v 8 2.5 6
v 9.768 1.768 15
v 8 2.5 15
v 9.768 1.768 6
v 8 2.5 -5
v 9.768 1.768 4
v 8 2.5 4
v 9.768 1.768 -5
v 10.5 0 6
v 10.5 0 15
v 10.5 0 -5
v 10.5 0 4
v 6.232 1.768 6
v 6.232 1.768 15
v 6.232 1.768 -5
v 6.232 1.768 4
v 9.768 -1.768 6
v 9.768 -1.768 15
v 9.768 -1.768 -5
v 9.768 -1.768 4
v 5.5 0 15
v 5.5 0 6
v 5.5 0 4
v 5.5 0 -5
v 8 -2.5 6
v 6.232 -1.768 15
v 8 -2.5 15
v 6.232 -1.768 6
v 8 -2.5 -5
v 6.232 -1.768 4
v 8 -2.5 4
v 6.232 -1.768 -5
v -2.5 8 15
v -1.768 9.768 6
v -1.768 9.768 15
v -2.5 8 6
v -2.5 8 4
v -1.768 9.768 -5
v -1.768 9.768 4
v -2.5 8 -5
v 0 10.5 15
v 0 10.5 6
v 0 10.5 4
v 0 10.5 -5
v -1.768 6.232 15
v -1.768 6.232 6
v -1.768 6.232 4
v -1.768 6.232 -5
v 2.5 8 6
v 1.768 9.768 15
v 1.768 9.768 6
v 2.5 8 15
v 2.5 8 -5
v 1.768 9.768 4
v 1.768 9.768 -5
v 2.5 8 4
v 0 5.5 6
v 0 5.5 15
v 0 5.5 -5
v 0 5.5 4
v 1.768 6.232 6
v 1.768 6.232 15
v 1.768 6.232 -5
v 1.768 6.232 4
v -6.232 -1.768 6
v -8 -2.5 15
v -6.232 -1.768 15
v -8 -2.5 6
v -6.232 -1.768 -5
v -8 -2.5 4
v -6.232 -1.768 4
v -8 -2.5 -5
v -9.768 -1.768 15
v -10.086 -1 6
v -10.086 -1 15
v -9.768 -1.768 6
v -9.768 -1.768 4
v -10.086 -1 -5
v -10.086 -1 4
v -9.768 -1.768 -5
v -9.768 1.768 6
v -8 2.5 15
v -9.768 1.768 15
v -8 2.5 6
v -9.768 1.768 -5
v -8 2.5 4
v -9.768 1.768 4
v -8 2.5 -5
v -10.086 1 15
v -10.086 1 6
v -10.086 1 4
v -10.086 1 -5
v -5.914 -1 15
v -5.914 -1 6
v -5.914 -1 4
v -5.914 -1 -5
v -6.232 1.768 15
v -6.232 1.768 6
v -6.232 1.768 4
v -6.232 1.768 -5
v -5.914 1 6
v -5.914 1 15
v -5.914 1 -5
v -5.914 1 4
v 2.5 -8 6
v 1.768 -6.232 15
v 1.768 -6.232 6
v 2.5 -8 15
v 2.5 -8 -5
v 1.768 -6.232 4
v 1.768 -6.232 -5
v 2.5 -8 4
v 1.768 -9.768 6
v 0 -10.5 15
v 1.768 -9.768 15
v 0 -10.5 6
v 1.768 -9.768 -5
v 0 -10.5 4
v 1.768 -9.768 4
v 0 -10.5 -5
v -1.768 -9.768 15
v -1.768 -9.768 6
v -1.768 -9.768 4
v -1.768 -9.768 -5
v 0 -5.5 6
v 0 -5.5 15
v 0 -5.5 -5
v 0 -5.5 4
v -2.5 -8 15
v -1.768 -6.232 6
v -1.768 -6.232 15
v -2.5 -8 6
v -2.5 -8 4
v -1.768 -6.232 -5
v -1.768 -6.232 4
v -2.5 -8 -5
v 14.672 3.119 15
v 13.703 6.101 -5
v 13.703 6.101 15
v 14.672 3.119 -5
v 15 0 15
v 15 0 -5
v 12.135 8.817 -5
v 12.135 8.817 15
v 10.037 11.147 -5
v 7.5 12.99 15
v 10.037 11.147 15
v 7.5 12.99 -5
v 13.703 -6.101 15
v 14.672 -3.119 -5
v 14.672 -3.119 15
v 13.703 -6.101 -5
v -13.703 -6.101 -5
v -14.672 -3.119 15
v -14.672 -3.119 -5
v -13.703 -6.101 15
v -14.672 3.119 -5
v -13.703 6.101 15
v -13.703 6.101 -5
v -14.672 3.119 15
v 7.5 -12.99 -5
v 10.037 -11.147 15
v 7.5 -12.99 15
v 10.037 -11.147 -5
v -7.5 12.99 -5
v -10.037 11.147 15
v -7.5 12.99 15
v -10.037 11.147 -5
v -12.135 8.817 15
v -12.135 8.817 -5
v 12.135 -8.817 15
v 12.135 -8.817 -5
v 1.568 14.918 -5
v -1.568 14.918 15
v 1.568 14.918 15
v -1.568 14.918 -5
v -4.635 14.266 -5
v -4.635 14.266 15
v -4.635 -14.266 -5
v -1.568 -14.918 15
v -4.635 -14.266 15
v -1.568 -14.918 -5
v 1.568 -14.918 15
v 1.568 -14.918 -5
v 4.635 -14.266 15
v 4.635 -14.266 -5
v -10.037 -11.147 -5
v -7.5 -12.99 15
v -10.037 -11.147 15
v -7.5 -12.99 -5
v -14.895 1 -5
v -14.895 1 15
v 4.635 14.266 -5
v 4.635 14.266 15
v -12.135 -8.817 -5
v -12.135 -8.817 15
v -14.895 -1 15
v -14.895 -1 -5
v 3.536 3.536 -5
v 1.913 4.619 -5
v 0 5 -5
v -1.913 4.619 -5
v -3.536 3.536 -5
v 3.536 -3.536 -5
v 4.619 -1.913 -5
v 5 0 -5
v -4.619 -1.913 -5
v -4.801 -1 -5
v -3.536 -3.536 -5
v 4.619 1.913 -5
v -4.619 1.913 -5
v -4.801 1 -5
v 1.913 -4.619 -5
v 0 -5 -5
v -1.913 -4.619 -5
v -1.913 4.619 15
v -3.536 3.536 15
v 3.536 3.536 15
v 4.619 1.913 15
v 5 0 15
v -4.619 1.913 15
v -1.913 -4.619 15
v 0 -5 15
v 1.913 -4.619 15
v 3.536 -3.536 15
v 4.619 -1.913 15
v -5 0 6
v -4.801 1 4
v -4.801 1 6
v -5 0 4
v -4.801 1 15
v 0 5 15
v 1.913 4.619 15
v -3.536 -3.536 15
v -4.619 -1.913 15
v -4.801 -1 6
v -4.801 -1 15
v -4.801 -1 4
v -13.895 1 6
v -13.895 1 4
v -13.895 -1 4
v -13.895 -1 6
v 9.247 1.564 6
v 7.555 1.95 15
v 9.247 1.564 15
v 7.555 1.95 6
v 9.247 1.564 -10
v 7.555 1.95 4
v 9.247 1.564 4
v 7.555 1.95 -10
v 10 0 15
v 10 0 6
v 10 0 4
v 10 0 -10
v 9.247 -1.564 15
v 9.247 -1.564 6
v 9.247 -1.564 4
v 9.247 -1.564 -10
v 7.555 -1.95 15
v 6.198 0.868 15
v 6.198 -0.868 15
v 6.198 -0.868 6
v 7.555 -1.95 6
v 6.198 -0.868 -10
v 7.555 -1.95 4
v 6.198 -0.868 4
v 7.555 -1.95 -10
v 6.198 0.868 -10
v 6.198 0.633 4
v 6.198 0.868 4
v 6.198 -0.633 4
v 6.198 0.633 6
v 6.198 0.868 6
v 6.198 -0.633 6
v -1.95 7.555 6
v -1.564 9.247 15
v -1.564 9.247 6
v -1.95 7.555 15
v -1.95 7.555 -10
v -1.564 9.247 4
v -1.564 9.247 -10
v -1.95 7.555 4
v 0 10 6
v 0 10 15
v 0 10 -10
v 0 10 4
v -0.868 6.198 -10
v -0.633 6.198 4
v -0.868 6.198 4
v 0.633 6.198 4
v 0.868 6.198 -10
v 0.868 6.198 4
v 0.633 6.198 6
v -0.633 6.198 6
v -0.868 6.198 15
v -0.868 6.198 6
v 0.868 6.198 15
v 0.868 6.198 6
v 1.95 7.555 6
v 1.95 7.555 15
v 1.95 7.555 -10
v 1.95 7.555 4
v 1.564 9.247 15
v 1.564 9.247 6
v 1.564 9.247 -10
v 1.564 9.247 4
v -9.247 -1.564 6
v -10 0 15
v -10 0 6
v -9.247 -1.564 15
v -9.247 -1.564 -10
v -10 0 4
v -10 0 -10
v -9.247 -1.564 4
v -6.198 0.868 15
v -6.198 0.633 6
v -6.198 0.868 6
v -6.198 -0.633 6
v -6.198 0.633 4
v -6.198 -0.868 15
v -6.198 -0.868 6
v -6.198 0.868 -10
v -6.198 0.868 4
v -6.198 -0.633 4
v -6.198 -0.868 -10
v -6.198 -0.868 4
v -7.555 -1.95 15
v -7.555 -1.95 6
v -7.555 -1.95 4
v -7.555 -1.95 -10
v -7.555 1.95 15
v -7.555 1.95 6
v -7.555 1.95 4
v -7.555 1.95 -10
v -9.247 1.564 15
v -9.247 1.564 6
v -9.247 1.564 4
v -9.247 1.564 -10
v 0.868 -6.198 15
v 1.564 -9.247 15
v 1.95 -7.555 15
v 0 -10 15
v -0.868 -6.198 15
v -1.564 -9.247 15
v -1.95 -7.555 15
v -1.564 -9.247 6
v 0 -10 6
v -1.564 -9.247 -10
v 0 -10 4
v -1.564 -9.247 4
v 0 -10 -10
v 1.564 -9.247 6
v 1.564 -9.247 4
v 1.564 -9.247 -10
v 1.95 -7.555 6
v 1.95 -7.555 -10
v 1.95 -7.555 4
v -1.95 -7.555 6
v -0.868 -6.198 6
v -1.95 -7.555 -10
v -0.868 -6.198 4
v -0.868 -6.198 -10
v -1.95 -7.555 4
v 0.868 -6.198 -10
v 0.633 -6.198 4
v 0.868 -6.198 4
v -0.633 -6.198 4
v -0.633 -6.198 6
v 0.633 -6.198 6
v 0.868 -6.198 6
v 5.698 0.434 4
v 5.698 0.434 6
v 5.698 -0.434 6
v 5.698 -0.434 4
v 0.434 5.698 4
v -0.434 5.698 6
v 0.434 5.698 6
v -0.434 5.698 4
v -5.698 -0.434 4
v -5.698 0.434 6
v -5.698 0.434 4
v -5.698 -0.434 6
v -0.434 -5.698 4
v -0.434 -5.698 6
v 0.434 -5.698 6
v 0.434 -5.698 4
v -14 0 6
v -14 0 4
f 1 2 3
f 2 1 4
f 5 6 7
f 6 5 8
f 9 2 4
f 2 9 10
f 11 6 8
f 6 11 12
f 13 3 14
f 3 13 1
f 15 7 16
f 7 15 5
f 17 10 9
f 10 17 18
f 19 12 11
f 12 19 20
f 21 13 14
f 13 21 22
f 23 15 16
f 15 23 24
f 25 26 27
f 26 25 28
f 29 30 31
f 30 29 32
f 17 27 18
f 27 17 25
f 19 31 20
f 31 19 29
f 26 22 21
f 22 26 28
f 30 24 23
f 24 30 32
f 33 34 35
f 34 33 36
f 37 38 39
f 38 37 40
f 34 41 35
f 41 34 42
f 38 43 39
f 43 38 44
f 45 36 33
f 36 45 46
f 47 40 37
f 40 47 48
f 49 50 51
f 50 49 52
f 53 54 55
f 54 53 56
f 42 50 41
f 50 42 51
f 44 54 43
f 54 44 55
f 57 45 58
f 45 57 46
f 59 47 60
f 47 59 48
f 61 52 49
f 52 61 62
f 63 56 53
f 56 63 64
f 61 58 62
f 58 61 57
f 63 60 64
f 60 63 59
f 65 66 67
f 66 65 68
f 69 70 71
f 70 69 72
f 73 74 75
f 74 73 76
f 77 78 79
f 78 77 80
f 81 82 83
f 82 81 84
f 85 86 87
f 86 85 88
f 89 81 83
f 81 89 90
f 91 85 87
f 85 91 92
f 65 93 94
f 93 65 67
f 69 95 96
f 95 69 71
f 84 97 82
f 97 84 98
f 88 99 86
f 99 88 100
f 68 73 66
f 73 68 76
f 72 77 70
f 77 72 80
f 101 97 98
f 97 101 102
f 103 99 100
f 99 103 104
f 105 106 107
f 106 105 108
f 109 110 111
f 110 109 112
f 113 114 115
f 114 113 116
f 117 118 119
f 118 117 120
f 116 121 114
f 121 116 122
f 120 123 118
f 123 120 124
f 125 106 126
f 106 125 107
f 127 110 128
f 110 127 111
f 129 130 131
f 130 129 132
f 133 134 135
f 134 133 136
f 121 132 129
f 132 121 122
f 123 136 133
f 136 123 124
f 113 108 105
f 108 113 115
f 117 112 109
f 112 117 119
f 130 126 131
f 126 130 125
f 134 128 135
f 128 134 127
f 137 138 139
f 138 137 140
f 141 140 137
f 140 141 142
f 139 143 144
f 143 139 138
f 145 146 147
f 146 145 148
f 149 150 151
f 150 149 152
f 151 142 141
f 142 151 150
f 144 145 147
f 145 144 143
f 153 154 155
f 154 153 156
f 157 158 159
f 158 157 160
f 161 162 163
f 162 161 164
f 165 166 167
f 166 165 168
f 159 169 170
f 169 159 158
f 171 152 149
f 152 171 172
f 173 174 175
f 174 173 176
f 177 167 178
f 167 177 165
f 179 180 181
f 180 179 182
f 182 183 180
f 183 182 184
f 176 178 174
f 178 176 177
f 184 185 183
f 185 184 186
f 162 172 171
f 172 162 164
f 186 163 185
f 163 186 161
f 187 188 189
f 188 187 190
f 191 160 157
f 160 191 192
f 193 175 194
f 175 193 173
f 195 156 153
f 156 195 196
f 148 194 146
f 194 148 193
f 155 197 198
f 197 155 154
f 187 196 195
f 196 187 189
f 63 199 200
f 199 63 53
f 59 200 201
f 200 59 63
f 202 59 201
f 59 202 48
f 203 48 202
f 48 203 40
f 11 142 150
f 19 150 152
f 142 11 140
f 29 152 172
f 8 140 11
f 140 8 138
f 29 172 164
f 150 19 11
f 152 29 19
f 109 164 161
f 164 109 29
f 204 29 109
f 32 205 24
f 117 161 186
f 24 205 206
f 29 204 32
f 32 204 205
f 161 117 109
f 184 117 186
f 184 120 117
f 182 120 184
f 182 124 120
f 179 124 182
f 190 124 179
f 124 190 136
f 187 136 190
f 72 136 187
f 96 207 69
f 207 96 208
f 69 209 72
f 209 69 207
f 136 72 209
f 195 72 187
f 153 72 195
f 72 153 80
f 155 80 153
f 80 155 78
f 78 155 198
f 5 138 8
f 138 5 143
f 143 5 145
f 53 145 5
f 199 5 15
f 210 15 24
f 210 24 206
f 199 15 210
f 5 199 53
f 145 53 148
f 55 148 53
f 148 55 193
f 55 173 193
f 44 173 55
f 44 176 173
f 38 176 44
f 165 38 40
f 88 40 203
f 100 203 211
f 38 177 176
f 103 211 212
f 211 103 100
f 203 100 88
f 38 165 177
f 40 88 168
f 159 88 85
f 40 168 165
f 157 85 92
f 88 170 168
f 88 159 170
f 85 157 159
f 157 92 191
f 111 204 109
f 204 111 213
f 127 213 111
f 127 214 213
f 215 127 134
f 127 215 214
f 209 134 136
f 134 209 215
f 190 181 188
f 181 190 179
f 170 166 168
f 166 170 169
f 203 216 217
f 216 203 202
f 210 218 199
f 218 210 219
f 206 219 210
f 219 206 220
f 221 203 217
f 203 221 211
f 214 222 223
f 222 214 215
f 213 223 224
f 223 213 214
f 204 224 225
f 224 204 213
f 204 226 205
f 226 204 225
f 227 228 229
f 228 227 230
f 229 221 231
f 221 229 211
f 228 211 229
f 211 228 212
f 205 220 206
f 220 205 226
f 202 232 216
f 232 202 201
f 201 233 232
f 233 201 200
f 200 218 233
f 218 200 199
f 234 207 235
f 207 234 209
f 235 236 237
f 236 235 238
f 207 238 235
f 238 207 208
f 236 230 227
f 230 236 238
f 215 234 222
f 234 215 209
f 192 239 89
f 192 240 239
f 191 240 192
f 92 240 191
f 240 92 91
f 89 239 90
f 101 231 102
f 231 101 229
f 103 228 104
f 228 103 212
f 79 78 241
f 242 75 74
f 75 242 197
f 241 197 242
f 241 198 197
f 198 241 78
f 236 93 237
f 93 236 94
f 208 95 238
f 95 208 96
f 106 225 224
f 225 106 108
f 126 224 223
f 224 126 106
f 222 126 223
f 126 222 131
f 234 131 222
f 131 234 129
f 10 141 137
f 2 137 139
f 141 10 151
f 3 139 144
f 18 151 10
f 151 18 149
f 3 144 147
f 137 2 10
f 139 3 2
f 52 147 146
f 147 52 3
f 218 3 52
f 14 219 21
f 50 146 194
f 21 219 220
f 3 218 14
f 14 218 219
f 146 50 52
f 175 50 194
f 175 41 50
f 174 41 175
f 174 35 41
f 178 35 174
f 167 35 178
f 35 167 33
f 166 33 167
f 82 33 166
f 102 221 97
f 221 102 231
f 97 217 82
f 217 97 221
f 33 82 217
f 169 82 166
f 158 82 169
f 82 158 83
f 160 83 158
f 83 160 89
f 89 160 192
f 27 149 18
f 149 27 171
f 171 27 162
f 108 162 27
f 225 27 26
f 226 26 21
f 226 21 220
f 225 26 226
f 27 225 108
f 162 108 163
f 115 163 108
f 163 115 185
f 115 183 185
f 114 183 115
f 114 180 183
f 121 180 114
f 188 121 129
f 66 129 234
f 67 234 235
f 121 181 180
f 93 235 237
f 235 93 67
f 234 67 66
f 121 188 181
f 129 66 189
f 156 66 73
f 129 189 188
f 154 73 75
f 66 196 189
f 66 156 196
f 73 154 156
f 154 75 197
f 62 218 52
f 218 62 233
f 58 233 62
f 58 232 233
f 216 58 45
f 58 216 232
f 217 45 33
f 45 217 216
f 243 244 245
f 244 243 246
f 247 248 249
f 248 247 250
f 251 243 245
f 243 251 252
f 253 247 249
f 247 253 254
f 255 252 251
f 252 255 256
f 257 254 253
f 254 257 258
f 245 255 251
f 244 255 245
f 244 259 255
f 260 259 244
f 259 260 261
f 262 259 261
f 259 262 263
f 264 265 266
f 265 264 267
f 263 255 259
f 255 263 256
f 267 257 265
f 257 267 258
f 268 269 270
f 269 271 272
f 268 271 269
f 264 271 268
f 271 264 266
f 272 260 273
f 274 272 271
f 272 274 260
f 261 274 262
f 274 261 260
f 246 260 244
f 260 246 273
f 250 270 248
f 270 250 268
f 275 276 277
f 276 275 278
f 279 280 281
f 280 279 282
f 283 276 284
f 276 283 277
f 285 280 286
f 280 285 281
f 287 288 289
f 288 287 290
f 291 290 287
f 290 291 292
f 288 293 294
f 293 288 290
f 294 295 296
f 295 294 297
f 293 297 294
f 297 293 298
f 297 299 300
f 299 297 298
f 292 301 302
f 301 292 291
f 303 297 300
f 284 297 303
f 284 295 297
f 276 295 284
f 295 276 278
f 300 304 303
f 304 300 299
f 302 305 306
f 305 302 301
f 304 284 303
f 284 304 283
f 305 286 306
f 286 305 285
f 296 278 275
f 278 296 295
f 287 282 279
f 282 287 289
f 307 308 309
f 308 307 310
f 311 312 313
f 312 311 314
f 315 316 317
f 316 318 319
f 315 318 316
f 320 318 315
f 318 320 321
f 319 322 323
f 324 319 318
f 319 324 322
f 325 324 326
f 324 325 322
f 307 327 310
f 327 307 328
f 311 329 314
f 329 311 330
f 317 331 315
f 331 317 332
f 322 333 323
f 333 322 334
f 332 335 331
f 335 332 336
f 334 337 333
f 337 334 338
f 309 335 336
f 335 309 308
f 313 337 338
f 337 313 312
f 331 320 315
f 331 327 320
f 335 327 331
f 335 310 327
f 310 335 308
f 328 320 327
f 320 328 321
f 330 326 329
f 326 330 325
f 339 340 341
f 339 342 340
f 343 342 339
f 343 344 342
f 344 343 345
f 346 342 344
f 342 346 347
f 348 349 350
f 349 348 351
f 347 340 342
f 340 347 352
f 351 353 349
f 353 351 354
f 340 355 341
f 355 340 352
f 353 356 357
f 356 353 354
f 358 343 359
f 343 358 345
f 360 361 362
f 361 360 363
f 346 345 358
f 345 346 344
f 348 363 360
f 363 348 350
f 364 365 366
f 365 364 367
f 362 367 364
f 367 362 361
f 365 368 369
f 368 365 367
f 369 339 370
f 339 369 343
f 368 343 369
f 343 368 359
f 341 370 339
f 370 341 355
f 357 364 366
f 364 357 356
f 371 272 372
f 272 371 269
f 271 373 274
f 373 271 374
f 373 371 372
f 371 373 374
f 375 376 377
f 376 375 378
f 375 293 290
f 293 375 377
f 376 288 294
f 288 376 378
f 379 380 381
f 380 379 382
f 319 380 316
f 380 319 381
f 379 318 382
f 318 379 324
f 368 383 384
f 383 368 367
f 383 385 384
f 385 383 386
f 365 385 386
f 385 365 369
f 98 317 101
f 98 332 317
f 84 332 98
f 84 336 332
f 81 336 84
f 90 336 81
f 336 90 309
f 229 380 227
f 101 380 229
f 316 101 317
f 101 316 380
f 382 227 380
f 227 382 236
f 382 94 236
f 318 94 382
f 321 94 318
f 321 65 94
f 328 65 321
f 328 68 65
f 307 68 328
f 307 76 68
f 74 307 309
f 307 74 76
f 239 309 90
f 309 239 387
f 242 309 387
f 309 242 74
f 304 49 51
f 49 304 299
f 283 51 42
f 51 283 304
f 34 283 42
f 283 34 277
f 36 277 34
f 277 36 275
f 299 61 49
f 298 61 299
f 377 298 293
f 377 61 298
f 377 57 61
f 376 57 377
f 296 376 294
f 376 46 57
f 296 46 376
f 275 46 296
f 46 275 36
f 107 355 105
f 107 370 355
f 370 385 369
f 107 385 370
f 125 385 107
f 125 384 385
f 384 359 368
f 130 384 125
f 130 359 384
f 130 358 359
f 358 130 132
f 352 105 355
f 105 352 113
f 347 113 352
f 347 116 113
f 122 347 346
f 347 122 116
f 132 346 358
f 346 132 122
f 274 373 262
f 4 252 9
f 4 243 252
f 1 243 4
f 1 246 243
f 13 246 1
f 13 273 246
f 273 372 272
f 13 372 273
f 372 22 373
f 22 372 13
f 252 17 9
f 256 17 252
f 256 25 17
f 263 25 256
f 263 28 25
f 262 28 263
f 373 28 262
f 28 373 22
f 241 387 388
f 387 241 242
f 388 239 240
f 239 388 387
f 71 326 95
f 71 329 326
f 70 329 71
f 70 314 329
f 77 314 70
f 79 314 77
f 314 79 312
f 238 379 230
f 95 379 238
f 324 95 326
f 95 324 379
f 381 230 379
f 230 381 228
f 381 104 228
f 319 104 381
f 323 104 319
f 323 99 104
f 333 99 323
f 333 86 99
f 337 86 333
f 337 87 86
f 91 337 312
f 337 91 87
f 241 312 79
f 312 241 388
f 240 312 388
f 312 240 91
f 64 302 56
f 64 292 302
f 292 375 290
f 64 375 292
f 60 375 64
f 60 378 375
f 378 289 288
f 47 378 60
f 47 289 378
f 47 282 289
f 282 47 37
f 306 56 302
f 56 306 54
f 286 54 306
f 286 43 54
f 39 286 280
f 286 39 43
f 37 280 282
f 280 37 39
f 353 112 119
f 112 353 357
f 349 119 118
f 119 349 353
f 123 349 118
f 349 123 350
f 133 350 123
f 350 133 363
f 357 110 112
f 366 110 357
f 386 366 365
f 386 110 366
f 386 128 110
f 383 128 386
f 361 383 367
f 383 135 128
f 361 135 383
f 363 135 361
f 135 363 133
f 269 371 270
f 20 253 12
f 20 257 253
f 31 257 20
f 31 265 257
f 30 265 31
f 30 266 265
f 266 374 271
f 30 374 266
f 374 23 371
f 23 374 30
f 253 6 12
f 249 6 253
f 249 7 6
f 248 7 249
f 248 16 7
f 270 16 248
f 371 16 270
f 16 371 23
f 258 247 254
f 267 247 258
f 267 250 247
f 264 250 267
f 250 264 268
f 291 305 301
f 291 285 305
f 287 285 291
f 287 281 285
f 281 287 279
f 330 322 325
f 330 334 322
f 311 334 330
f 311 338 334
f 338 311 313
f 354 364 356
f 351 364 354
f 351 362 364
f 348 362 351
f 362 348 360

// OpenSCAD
// Parameters
hub_diameter = 30;
hub_height = 10; // Shortened to match the original model
bore_diameter = 10;
fastening_hole_diameter = 5;
fastening_hole_offset = 8; // Adjusted hole positions
slit_width = 2;
slit_depth = hub_diameter / 2; // Extended slit depth
spacer_thickness = 2;
spacer_wavy_amplitude = 2; // Increased for better flexibility
spacer_wavy_frequency = 4; // Adjusted for a more distinct wavy shape
screw_diameter = 4;
screw_length = 20;

// Module for a single hub
module hub() {
    difference() {
        cylinder(d=hub_diameter, h=hub_height, center=true);
        
        // Central bore
        cylinder(d=bore_diameter, h=hub_height + 2, center=true);
        
        // Fastening holes
        for (i = [0:3]) {
            rotate([0, 0, i * 90])
                translate([fastening_hole_offset, 0, 0])
                cylinder(d=fastening_hole_diameter, h=hub_height + 2, center=true);
        }
        
        // Slit for clamping flexibility (extended depth)
        translate([-hub_diameter/2, 0, 0])
            cube([hub_diameter, slit_width, hub_height + 2], center=true);
        
        // Additional cut to extend slit towards the center
        translate([-slit_depth, 0, 0])
            cube([slit_depth, slit_width, hub_height + 2], center=true);
    }
}

// Module for the flexible spacer
module flexible_spacer() {
    difference() {
        cylinder(d=hub_diameter - 2, h=spacer_thickness, center=true);
        
        // Central bore
        cylinder(d=bore_diameter, h=spacer_thickness + 2, center=true);
        
        // Wavy profile (more distinct)
        for (i = [0:spacer_wavy_frequency-1]) {
            rotate([0, 0, i * (360 / spacer_wavy_frequency)])
                translate([hub_diameter/4, 0, 0])
                scale([1, 0.5, 1])
                cylinder(d=spacer_wavy_amplitude * 2, h=spacer_thickness + 2, center=true);
        }
    }
}

// Module for a fastening screw
module fastening_screw() {
    translate([0, 0, -hub_height/2])
        cylinder(d=screw_diameter, h=screw_length, center=true);
}

// Assembly
module flexible_coupling() {
    translate([0, 0, hub_height])
        hub();
    
    // Fastening screws (top layer, correctly positioned)
    for (i = [0:3]) {
        rotate([0, 0, i * 90])
            translate([fastening_hole_offset, 0, hub_height])
            fastening_screw();
    }
    
    // Flexible spacer
    translate([0, 0, hub_height/2])
        flexible_spacer();
    
    // Fastening screws (bottom layer, correctly positioned)
    for (i = [0:3]) {
        rotate([0, 0, i * 90])
            translate([fastening_hole_offset, 0, hub_height/2])
            fastening_screw();
    }
    
    // Bottom hub
    hub();
}

// Render the full model
flexible_coupling();
